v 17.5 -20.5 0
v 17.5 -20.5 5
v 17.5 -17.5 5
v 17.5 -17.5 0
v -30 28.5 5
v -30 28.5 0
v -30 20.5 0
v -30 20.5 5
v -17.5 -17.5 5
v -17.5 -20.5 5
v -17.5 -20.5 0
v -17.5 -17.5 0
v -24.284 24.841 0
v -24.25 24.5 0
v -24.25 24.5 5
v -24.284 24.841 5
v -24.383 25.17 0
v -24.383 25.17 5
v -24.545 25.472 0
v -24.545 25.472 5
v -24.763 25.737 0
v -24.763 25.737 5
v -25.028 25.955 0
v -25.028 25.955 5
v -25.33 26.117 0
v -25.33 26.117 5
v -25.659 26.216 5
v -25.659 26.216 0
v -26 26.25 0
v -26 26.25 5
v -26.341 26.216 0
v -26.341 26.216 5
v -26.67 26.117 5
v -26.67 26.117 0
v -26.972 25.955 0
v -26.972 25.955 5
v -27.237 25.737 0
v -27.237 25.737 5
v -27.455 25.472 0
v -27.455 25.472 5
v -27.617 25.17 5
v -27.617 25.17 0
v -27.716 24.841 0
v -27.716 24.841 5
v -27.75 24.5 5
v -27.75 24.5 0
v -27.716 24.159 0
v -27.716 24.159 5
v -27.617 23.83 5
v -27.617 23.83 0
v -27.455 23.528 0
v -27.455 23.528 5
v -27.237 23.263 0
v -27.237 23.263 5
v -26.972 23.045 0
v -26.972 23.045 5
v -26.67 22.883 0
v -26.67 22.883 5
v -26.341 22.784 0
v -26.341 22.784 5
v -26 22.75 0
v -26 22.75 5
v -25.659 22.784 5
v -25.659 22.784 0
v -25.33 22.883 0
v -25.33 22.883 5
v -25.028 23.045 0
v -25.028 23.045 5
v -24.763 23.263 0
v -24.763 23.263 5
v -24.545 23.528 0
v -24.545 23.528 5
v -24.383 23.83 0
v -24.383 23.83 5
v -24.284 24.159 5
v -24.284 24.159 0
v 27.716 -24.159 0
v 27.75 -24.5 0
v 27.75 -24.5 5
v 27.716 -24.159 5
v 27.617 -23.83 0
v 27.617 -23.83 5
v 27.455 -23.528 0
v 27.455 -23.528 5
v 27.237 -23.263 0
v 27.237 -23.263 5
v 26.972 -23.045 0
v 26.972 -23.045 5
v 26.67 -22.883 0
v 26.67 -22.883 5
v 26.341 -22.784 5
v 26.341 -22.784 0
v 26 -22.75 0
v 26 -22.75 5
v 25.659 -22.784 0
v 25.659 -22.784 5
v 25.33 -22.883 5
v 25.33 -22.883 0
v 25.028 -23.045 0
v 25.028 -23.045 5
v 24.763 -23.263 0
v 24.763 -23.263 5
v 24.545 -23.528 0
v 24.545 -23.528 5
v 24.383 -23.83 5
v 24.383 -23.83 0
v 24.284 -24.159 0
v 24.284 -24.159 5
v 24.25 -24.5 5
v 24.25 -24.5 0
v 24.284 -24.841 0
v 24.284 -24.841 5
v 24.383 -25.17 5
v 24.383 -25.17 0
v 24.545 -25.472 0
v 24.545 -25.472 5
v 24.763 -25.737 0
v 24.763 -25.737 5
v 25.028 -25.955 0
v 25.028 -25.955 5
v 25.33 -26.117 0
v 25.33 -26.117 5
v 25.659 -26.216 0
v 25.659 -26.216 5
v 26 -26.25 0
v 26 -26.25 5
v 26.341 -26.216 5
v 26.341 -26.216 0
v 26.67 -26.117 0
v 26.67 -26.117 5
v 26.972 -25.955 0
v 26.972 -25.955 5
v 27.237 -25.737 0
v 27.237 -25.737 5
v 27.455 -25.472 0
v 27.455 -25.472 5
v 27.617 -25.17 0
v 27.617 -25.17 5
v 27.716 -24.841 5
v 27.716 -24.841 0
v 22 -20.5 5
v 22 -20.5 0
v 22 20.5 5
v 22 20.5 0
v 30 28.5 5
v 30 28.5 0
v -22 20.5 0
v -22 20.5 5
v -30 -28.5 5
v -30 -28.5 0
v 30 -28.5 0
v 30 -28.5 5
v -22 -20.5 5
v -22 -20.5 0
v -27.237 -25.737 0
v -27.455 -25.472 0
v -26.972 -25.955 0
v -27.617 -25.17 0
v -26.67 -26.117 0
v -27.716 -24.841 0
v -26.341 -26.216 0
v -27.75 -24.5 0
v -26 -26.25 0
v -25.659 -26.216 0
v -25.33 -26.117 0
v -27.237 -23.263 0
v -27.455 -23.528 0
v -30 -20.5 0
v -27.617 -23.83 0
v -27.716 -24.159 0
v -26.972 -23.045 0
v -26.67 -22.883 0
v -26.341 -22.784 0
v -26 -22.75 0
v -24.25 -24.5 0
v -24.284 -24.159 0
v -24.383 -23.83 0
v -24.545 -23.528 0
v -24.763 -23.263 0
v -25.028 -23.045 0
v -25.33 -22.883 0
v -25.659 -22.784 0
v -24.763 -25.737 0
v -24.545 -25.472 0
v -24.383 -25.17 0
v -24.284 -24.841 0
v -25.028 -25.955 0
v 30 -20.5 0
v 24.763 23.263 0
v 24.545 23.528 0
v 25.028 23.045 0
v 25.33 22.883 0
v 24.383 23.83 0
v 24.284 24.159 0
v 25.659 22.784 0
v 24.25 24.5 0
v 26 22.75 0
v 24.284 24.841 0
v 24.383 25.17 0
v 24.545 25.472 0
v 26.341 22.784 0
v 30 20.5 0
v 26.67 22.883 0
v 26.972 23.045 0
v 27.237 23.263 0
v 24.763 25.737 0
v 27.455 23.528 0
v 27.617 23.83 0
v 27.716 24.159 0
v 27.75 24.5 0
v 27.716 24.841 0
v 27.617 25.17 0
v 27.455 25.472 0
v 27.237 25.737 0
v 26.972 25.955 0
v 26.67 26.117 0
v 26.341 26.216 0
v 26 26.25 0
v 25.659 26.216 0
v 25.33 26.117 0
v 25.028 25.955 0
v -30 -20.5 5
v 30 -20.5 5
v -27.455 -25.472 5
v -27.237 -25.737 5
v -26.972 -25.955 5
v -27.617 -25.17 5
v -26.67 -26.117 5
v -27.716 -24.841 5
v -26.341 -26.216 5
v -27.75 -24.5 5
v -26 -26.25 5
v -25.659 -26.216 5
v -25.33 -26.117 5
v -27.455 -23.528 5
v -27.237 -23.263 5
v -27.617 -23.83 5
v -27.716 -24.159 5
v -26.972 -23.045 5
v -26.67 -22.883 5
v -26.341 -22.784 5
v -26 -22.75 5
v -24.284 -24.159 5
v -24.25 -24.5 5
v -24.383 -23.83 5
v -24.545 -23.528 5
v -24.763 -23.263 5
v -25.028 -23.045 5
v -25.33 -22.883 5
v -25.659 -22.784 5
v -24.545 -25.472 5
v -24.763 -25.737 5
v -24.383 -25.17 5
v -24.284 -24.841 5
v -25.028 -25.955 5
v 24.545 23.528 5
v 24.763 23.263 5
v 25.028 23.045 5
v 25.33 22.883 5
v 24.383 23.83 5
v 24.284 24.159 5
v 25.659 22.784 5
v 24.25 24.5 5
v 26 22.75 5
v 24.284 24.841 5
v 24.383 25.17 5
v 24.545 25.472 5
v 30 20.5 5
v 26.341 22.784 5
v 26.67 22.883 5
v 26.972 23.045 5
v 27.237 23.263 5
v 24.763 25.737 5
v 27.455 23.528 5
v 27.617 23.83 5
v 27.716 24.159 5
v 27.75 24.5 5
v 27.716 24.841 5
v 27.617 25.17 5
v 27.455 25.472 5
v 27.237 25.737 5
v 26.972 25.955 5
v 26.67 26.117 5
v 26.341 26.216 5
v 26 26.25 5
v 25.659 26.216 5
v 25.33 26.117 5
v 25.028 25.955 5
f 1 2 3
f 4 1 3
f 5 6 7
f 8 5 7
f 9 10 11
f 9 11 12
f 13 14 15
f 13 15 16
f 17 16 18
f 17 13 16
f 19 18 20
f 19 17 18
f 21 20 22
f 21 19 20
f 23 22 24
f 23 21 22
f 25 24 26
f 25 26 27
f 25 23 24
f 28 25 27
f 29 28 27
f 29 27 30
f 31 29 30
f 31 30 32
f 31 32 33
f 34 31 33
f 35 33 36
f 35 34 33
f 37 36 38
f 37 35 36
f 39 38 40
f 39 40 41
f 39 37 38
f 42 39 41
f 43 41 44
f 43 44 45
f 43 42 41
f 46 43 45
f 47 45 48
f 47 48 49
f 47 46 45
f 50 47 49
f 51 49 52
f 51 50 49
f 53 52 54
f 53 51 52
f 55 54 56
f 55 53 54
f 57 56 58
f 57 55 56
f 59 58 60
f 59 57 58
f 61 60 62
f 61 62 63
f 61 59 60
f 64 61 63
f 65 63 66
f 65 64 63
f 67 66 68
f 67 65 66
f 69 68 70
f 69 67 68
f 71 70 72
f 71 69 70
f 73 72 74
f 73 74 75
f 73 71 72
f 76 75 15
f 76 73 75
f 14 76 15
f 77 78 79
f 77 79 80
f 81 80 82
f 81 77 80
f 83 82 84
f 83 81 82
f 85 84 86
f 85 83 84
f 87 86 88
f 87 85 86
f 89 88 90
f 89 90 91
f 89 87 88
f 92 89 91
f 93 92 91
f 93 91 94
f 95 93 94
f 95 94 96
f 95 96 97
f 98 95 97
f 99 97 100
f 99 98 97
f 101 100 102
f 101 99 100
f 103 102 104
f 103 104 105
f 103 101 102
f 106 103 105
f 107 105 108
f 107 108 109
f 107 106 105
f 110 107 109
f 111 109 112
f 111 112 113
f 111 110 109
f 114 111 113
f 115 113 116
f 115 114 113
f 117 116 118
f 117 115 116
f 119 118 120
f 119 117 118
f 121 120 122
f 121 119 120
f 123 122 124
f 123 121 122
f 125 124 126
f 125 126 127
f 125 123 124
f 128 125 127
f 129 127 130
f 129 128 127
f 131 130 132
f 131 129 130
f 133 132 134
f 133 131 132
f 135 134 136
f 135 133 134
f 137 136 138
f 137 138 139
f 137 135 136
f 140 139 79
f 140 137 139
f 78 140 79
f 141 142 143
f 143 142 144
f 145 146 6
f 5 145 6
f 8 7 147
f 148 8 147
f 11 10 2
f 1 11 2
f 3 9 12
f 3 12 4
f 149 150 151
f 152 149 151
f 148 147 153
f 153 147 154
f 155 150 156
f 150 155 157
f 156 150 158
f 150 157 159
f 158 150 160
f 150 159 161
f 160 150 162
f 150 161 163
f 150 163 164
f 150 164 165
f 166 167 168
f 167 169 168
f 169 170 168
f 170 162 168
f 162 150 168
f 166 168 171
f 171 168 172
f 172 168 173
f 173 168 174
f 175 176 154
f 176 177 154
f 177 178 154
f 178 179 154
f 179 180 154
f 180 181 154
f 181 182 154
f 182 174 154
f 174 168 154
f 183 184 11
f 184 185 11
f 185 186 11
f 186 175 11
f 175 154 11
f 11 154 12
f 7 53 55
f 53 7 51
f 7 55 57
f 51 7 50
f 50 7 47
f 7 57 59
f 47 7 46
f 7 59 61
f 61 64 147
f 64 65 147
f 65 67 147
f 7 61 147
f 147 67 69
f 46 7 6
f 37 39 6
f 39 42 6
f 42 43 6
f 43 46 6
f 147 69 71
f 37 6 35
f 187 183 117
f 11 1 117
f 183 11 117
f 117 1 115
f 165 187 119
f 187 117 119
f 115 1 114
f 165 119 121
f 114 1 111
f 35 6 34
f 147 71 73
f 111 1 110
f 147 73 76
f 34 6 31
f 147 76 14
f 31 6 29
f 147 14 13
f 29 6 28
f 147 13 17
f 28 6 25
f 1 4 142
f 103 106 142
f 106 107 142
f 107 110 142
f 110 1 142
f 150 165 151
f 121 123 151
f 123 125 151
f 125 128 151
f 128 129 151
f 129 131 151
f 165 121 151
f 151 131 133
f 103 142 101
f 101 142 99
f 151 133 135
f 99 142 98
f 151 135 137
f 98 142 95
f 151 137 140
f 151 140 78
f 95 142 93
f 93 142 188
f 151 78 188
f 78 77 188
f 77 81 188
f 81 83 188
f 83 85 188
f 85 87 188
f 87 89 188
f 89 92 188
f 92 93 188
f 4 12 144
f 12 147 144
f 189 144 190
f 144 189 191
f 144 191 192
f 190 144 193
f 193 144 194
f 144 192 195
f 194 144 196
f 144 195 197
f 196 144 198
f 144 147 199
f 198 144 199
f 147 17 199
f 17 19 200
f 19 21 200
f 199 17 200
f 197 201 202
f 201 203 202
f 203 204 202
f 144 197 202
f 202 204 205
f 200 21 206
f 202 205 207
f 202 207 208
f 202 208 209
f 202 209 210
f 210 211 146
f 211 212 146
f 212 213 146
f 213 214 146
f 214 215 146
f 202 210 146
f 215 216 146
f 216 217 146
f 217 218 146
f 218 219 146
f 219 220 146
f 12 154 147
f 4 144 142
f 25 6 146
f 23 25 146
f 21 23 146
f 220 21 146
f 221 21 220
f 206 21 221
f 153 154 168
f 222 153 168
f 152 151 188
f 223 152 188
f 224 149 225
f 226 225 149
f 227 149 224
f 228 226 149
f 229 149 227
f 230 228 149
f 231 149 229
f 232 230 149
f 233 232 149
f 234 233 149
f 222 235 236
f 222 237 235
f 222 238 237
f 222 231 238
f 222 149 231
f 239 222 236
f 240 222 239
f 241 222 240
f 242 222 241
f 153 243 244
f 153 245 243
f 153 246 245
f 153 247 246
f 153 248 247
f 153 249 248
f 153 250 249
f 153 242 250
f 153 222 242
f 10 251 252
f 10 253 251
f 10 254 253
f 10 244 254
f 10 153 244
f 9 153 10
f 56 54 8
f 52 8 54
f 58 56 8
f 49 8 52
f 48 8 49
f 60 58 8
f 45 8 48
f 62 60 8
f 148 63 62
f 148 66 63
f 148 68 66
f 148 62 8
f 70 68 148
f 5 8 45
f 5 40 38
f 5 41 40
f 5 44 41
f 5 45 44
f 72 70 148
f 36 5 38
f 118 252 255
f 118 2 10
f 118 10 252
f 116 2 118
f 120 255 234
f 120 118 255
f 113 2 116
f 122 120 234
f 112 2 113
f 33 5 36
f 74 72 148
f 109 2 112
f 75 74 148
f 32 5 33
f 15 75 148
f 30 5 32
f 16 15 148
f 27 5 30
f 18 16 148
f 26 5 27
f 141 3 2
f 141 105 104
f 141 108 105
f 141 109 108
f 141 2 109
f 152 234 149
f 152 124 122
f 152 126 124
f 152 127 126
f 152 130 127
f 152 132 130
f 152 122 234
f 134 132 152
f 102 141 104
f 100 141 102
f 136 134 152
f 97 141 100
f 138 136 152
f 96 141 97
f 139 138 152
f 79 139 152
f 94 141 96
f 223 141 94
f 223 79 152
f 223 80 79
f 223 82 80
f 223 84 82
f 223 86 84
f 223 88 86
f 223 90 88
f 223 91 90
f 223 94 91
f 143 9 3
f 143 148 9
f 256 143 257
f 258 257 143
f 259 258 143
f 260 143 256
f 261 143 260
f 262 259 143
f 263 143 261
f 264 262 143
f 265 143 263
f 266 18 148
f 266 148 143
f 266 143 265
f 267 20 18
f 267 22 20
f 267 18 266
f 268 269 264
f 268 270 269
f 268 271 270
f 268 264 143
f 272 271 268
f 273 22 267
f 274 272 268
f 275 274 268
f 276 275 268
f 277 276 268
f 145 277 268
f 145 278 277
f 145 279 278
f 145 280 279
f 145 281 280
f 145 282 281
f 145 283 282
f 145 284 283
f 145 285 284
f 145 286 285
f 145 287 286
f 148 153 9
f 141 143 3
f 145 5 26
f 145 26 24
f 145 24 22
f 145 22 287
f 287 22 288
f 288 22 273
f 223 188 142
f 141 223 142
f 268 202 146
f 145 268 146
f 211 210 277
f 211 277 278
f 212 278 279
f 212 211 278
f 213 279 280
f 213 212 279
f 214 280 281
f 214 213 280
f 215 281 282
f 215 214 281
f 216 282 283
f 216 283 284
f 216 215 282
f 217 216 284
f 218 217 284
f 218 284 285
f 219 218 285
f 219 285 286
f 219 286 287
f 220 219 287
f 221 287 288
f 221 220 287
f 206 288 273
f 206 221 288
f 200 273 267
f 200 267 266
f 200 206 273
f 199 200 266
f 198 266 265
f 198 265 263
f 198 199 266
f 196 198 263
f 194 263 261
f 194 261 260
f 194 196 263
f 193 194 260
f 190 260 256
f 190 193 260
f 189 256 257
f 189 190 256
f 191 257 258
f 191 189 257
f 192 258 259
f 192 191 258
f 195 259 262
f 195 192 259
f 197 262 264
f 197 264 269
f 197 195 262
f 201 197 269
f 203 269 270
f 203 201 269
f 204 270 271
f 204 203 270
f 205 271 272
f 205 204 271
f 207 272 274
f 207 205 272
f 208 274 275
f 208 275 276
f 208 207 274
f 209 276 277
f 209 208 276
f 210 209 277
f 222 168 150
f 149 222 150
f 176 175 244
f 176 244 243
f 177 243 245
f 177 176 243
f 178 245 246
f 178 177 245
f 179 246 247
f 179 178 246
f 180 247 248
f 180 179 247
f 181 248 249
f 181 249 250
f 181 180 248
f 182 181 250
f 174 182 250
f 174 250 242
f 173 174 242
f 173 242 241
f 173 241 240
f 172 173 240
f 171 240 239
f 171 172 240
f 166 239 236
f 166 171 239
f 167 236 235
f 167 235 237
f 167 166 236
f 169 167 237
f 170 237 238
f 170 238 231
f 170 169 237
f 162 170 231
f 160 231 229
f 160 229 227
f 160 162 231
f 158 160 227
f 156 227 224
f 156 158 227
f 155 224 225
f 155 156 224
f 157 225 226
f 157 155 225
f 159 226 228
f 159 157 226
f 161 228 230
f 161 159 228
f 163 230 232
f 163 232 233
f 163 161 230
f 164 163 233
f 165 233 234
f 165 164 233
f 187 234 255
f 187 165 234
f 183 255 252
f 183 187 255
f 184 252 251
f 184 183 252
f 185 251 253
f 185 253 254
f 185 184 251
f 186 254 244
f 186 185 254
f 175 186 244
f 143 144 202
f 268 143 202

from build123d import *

# Parameters (mm, degrees)
SKETCH_1_R          = 1.75
EXTRUDE_1_DEPTH     = 5
CUT_EXTRUDE_1_REACH = 7
SKETCH_2_W          = 35
SKETCH_2_H          = 3


with BuildPart() as part:
    # 草圖1 → 填料-伸長1 (new body)
    with BuildSketch(Plane.XY):
        Polygon((-30, 28.5), (-30, 20.5), (-22, 20.5), (-22, -20.5), (-30, -20.5), (-30, -28.5), (30, -28.5), (30, -20.5), (22, -20.5), (22, 20.5), (30, 20.5), (30, 28.5), align=None)
        with Locations((-26, 24.5)):
            Circle(SKETCH_1_R, mode=Mode.SUBTRACT)
        with Locations((26, 24.5)):
            Circle(SKETCH_1_R, mode=Mode.SUBTRACT)
        with Locations((-26, -24.5)):
            Circle(SKETCH_1_R, mode=Mode.SUBTRACT)
        with Locations((26, -24.5)):
            Circle(SKETCH_1_R, mode=Mode.SUBTRACT)
    extrude(amount=EXTRUDE_1_DEPTH)

    # 草圖2 → 除料-伸長1 (cut, up to next)
    with BuildSketch(Plane.XY.offset(5), mode=Mode.PRIVATE) as cut_extrude_1_sk1:
        with Locations((0, -19)):
            Rectangle(SKETCH_2_W, SKETCH_2_H)
    cut_extrude_1_tool1 = extrude(cut_extrude_1_sk1.sketch, amount=-CUT_EXTRUDE_1_REACH, mode=Mode.PRIVATE) & part.part
    add(cut_extrude_1_tool1.solids().sort_by_distance((0, -19, 5))[0], mode=Mode.SUBTRACT)


solid = part.part
